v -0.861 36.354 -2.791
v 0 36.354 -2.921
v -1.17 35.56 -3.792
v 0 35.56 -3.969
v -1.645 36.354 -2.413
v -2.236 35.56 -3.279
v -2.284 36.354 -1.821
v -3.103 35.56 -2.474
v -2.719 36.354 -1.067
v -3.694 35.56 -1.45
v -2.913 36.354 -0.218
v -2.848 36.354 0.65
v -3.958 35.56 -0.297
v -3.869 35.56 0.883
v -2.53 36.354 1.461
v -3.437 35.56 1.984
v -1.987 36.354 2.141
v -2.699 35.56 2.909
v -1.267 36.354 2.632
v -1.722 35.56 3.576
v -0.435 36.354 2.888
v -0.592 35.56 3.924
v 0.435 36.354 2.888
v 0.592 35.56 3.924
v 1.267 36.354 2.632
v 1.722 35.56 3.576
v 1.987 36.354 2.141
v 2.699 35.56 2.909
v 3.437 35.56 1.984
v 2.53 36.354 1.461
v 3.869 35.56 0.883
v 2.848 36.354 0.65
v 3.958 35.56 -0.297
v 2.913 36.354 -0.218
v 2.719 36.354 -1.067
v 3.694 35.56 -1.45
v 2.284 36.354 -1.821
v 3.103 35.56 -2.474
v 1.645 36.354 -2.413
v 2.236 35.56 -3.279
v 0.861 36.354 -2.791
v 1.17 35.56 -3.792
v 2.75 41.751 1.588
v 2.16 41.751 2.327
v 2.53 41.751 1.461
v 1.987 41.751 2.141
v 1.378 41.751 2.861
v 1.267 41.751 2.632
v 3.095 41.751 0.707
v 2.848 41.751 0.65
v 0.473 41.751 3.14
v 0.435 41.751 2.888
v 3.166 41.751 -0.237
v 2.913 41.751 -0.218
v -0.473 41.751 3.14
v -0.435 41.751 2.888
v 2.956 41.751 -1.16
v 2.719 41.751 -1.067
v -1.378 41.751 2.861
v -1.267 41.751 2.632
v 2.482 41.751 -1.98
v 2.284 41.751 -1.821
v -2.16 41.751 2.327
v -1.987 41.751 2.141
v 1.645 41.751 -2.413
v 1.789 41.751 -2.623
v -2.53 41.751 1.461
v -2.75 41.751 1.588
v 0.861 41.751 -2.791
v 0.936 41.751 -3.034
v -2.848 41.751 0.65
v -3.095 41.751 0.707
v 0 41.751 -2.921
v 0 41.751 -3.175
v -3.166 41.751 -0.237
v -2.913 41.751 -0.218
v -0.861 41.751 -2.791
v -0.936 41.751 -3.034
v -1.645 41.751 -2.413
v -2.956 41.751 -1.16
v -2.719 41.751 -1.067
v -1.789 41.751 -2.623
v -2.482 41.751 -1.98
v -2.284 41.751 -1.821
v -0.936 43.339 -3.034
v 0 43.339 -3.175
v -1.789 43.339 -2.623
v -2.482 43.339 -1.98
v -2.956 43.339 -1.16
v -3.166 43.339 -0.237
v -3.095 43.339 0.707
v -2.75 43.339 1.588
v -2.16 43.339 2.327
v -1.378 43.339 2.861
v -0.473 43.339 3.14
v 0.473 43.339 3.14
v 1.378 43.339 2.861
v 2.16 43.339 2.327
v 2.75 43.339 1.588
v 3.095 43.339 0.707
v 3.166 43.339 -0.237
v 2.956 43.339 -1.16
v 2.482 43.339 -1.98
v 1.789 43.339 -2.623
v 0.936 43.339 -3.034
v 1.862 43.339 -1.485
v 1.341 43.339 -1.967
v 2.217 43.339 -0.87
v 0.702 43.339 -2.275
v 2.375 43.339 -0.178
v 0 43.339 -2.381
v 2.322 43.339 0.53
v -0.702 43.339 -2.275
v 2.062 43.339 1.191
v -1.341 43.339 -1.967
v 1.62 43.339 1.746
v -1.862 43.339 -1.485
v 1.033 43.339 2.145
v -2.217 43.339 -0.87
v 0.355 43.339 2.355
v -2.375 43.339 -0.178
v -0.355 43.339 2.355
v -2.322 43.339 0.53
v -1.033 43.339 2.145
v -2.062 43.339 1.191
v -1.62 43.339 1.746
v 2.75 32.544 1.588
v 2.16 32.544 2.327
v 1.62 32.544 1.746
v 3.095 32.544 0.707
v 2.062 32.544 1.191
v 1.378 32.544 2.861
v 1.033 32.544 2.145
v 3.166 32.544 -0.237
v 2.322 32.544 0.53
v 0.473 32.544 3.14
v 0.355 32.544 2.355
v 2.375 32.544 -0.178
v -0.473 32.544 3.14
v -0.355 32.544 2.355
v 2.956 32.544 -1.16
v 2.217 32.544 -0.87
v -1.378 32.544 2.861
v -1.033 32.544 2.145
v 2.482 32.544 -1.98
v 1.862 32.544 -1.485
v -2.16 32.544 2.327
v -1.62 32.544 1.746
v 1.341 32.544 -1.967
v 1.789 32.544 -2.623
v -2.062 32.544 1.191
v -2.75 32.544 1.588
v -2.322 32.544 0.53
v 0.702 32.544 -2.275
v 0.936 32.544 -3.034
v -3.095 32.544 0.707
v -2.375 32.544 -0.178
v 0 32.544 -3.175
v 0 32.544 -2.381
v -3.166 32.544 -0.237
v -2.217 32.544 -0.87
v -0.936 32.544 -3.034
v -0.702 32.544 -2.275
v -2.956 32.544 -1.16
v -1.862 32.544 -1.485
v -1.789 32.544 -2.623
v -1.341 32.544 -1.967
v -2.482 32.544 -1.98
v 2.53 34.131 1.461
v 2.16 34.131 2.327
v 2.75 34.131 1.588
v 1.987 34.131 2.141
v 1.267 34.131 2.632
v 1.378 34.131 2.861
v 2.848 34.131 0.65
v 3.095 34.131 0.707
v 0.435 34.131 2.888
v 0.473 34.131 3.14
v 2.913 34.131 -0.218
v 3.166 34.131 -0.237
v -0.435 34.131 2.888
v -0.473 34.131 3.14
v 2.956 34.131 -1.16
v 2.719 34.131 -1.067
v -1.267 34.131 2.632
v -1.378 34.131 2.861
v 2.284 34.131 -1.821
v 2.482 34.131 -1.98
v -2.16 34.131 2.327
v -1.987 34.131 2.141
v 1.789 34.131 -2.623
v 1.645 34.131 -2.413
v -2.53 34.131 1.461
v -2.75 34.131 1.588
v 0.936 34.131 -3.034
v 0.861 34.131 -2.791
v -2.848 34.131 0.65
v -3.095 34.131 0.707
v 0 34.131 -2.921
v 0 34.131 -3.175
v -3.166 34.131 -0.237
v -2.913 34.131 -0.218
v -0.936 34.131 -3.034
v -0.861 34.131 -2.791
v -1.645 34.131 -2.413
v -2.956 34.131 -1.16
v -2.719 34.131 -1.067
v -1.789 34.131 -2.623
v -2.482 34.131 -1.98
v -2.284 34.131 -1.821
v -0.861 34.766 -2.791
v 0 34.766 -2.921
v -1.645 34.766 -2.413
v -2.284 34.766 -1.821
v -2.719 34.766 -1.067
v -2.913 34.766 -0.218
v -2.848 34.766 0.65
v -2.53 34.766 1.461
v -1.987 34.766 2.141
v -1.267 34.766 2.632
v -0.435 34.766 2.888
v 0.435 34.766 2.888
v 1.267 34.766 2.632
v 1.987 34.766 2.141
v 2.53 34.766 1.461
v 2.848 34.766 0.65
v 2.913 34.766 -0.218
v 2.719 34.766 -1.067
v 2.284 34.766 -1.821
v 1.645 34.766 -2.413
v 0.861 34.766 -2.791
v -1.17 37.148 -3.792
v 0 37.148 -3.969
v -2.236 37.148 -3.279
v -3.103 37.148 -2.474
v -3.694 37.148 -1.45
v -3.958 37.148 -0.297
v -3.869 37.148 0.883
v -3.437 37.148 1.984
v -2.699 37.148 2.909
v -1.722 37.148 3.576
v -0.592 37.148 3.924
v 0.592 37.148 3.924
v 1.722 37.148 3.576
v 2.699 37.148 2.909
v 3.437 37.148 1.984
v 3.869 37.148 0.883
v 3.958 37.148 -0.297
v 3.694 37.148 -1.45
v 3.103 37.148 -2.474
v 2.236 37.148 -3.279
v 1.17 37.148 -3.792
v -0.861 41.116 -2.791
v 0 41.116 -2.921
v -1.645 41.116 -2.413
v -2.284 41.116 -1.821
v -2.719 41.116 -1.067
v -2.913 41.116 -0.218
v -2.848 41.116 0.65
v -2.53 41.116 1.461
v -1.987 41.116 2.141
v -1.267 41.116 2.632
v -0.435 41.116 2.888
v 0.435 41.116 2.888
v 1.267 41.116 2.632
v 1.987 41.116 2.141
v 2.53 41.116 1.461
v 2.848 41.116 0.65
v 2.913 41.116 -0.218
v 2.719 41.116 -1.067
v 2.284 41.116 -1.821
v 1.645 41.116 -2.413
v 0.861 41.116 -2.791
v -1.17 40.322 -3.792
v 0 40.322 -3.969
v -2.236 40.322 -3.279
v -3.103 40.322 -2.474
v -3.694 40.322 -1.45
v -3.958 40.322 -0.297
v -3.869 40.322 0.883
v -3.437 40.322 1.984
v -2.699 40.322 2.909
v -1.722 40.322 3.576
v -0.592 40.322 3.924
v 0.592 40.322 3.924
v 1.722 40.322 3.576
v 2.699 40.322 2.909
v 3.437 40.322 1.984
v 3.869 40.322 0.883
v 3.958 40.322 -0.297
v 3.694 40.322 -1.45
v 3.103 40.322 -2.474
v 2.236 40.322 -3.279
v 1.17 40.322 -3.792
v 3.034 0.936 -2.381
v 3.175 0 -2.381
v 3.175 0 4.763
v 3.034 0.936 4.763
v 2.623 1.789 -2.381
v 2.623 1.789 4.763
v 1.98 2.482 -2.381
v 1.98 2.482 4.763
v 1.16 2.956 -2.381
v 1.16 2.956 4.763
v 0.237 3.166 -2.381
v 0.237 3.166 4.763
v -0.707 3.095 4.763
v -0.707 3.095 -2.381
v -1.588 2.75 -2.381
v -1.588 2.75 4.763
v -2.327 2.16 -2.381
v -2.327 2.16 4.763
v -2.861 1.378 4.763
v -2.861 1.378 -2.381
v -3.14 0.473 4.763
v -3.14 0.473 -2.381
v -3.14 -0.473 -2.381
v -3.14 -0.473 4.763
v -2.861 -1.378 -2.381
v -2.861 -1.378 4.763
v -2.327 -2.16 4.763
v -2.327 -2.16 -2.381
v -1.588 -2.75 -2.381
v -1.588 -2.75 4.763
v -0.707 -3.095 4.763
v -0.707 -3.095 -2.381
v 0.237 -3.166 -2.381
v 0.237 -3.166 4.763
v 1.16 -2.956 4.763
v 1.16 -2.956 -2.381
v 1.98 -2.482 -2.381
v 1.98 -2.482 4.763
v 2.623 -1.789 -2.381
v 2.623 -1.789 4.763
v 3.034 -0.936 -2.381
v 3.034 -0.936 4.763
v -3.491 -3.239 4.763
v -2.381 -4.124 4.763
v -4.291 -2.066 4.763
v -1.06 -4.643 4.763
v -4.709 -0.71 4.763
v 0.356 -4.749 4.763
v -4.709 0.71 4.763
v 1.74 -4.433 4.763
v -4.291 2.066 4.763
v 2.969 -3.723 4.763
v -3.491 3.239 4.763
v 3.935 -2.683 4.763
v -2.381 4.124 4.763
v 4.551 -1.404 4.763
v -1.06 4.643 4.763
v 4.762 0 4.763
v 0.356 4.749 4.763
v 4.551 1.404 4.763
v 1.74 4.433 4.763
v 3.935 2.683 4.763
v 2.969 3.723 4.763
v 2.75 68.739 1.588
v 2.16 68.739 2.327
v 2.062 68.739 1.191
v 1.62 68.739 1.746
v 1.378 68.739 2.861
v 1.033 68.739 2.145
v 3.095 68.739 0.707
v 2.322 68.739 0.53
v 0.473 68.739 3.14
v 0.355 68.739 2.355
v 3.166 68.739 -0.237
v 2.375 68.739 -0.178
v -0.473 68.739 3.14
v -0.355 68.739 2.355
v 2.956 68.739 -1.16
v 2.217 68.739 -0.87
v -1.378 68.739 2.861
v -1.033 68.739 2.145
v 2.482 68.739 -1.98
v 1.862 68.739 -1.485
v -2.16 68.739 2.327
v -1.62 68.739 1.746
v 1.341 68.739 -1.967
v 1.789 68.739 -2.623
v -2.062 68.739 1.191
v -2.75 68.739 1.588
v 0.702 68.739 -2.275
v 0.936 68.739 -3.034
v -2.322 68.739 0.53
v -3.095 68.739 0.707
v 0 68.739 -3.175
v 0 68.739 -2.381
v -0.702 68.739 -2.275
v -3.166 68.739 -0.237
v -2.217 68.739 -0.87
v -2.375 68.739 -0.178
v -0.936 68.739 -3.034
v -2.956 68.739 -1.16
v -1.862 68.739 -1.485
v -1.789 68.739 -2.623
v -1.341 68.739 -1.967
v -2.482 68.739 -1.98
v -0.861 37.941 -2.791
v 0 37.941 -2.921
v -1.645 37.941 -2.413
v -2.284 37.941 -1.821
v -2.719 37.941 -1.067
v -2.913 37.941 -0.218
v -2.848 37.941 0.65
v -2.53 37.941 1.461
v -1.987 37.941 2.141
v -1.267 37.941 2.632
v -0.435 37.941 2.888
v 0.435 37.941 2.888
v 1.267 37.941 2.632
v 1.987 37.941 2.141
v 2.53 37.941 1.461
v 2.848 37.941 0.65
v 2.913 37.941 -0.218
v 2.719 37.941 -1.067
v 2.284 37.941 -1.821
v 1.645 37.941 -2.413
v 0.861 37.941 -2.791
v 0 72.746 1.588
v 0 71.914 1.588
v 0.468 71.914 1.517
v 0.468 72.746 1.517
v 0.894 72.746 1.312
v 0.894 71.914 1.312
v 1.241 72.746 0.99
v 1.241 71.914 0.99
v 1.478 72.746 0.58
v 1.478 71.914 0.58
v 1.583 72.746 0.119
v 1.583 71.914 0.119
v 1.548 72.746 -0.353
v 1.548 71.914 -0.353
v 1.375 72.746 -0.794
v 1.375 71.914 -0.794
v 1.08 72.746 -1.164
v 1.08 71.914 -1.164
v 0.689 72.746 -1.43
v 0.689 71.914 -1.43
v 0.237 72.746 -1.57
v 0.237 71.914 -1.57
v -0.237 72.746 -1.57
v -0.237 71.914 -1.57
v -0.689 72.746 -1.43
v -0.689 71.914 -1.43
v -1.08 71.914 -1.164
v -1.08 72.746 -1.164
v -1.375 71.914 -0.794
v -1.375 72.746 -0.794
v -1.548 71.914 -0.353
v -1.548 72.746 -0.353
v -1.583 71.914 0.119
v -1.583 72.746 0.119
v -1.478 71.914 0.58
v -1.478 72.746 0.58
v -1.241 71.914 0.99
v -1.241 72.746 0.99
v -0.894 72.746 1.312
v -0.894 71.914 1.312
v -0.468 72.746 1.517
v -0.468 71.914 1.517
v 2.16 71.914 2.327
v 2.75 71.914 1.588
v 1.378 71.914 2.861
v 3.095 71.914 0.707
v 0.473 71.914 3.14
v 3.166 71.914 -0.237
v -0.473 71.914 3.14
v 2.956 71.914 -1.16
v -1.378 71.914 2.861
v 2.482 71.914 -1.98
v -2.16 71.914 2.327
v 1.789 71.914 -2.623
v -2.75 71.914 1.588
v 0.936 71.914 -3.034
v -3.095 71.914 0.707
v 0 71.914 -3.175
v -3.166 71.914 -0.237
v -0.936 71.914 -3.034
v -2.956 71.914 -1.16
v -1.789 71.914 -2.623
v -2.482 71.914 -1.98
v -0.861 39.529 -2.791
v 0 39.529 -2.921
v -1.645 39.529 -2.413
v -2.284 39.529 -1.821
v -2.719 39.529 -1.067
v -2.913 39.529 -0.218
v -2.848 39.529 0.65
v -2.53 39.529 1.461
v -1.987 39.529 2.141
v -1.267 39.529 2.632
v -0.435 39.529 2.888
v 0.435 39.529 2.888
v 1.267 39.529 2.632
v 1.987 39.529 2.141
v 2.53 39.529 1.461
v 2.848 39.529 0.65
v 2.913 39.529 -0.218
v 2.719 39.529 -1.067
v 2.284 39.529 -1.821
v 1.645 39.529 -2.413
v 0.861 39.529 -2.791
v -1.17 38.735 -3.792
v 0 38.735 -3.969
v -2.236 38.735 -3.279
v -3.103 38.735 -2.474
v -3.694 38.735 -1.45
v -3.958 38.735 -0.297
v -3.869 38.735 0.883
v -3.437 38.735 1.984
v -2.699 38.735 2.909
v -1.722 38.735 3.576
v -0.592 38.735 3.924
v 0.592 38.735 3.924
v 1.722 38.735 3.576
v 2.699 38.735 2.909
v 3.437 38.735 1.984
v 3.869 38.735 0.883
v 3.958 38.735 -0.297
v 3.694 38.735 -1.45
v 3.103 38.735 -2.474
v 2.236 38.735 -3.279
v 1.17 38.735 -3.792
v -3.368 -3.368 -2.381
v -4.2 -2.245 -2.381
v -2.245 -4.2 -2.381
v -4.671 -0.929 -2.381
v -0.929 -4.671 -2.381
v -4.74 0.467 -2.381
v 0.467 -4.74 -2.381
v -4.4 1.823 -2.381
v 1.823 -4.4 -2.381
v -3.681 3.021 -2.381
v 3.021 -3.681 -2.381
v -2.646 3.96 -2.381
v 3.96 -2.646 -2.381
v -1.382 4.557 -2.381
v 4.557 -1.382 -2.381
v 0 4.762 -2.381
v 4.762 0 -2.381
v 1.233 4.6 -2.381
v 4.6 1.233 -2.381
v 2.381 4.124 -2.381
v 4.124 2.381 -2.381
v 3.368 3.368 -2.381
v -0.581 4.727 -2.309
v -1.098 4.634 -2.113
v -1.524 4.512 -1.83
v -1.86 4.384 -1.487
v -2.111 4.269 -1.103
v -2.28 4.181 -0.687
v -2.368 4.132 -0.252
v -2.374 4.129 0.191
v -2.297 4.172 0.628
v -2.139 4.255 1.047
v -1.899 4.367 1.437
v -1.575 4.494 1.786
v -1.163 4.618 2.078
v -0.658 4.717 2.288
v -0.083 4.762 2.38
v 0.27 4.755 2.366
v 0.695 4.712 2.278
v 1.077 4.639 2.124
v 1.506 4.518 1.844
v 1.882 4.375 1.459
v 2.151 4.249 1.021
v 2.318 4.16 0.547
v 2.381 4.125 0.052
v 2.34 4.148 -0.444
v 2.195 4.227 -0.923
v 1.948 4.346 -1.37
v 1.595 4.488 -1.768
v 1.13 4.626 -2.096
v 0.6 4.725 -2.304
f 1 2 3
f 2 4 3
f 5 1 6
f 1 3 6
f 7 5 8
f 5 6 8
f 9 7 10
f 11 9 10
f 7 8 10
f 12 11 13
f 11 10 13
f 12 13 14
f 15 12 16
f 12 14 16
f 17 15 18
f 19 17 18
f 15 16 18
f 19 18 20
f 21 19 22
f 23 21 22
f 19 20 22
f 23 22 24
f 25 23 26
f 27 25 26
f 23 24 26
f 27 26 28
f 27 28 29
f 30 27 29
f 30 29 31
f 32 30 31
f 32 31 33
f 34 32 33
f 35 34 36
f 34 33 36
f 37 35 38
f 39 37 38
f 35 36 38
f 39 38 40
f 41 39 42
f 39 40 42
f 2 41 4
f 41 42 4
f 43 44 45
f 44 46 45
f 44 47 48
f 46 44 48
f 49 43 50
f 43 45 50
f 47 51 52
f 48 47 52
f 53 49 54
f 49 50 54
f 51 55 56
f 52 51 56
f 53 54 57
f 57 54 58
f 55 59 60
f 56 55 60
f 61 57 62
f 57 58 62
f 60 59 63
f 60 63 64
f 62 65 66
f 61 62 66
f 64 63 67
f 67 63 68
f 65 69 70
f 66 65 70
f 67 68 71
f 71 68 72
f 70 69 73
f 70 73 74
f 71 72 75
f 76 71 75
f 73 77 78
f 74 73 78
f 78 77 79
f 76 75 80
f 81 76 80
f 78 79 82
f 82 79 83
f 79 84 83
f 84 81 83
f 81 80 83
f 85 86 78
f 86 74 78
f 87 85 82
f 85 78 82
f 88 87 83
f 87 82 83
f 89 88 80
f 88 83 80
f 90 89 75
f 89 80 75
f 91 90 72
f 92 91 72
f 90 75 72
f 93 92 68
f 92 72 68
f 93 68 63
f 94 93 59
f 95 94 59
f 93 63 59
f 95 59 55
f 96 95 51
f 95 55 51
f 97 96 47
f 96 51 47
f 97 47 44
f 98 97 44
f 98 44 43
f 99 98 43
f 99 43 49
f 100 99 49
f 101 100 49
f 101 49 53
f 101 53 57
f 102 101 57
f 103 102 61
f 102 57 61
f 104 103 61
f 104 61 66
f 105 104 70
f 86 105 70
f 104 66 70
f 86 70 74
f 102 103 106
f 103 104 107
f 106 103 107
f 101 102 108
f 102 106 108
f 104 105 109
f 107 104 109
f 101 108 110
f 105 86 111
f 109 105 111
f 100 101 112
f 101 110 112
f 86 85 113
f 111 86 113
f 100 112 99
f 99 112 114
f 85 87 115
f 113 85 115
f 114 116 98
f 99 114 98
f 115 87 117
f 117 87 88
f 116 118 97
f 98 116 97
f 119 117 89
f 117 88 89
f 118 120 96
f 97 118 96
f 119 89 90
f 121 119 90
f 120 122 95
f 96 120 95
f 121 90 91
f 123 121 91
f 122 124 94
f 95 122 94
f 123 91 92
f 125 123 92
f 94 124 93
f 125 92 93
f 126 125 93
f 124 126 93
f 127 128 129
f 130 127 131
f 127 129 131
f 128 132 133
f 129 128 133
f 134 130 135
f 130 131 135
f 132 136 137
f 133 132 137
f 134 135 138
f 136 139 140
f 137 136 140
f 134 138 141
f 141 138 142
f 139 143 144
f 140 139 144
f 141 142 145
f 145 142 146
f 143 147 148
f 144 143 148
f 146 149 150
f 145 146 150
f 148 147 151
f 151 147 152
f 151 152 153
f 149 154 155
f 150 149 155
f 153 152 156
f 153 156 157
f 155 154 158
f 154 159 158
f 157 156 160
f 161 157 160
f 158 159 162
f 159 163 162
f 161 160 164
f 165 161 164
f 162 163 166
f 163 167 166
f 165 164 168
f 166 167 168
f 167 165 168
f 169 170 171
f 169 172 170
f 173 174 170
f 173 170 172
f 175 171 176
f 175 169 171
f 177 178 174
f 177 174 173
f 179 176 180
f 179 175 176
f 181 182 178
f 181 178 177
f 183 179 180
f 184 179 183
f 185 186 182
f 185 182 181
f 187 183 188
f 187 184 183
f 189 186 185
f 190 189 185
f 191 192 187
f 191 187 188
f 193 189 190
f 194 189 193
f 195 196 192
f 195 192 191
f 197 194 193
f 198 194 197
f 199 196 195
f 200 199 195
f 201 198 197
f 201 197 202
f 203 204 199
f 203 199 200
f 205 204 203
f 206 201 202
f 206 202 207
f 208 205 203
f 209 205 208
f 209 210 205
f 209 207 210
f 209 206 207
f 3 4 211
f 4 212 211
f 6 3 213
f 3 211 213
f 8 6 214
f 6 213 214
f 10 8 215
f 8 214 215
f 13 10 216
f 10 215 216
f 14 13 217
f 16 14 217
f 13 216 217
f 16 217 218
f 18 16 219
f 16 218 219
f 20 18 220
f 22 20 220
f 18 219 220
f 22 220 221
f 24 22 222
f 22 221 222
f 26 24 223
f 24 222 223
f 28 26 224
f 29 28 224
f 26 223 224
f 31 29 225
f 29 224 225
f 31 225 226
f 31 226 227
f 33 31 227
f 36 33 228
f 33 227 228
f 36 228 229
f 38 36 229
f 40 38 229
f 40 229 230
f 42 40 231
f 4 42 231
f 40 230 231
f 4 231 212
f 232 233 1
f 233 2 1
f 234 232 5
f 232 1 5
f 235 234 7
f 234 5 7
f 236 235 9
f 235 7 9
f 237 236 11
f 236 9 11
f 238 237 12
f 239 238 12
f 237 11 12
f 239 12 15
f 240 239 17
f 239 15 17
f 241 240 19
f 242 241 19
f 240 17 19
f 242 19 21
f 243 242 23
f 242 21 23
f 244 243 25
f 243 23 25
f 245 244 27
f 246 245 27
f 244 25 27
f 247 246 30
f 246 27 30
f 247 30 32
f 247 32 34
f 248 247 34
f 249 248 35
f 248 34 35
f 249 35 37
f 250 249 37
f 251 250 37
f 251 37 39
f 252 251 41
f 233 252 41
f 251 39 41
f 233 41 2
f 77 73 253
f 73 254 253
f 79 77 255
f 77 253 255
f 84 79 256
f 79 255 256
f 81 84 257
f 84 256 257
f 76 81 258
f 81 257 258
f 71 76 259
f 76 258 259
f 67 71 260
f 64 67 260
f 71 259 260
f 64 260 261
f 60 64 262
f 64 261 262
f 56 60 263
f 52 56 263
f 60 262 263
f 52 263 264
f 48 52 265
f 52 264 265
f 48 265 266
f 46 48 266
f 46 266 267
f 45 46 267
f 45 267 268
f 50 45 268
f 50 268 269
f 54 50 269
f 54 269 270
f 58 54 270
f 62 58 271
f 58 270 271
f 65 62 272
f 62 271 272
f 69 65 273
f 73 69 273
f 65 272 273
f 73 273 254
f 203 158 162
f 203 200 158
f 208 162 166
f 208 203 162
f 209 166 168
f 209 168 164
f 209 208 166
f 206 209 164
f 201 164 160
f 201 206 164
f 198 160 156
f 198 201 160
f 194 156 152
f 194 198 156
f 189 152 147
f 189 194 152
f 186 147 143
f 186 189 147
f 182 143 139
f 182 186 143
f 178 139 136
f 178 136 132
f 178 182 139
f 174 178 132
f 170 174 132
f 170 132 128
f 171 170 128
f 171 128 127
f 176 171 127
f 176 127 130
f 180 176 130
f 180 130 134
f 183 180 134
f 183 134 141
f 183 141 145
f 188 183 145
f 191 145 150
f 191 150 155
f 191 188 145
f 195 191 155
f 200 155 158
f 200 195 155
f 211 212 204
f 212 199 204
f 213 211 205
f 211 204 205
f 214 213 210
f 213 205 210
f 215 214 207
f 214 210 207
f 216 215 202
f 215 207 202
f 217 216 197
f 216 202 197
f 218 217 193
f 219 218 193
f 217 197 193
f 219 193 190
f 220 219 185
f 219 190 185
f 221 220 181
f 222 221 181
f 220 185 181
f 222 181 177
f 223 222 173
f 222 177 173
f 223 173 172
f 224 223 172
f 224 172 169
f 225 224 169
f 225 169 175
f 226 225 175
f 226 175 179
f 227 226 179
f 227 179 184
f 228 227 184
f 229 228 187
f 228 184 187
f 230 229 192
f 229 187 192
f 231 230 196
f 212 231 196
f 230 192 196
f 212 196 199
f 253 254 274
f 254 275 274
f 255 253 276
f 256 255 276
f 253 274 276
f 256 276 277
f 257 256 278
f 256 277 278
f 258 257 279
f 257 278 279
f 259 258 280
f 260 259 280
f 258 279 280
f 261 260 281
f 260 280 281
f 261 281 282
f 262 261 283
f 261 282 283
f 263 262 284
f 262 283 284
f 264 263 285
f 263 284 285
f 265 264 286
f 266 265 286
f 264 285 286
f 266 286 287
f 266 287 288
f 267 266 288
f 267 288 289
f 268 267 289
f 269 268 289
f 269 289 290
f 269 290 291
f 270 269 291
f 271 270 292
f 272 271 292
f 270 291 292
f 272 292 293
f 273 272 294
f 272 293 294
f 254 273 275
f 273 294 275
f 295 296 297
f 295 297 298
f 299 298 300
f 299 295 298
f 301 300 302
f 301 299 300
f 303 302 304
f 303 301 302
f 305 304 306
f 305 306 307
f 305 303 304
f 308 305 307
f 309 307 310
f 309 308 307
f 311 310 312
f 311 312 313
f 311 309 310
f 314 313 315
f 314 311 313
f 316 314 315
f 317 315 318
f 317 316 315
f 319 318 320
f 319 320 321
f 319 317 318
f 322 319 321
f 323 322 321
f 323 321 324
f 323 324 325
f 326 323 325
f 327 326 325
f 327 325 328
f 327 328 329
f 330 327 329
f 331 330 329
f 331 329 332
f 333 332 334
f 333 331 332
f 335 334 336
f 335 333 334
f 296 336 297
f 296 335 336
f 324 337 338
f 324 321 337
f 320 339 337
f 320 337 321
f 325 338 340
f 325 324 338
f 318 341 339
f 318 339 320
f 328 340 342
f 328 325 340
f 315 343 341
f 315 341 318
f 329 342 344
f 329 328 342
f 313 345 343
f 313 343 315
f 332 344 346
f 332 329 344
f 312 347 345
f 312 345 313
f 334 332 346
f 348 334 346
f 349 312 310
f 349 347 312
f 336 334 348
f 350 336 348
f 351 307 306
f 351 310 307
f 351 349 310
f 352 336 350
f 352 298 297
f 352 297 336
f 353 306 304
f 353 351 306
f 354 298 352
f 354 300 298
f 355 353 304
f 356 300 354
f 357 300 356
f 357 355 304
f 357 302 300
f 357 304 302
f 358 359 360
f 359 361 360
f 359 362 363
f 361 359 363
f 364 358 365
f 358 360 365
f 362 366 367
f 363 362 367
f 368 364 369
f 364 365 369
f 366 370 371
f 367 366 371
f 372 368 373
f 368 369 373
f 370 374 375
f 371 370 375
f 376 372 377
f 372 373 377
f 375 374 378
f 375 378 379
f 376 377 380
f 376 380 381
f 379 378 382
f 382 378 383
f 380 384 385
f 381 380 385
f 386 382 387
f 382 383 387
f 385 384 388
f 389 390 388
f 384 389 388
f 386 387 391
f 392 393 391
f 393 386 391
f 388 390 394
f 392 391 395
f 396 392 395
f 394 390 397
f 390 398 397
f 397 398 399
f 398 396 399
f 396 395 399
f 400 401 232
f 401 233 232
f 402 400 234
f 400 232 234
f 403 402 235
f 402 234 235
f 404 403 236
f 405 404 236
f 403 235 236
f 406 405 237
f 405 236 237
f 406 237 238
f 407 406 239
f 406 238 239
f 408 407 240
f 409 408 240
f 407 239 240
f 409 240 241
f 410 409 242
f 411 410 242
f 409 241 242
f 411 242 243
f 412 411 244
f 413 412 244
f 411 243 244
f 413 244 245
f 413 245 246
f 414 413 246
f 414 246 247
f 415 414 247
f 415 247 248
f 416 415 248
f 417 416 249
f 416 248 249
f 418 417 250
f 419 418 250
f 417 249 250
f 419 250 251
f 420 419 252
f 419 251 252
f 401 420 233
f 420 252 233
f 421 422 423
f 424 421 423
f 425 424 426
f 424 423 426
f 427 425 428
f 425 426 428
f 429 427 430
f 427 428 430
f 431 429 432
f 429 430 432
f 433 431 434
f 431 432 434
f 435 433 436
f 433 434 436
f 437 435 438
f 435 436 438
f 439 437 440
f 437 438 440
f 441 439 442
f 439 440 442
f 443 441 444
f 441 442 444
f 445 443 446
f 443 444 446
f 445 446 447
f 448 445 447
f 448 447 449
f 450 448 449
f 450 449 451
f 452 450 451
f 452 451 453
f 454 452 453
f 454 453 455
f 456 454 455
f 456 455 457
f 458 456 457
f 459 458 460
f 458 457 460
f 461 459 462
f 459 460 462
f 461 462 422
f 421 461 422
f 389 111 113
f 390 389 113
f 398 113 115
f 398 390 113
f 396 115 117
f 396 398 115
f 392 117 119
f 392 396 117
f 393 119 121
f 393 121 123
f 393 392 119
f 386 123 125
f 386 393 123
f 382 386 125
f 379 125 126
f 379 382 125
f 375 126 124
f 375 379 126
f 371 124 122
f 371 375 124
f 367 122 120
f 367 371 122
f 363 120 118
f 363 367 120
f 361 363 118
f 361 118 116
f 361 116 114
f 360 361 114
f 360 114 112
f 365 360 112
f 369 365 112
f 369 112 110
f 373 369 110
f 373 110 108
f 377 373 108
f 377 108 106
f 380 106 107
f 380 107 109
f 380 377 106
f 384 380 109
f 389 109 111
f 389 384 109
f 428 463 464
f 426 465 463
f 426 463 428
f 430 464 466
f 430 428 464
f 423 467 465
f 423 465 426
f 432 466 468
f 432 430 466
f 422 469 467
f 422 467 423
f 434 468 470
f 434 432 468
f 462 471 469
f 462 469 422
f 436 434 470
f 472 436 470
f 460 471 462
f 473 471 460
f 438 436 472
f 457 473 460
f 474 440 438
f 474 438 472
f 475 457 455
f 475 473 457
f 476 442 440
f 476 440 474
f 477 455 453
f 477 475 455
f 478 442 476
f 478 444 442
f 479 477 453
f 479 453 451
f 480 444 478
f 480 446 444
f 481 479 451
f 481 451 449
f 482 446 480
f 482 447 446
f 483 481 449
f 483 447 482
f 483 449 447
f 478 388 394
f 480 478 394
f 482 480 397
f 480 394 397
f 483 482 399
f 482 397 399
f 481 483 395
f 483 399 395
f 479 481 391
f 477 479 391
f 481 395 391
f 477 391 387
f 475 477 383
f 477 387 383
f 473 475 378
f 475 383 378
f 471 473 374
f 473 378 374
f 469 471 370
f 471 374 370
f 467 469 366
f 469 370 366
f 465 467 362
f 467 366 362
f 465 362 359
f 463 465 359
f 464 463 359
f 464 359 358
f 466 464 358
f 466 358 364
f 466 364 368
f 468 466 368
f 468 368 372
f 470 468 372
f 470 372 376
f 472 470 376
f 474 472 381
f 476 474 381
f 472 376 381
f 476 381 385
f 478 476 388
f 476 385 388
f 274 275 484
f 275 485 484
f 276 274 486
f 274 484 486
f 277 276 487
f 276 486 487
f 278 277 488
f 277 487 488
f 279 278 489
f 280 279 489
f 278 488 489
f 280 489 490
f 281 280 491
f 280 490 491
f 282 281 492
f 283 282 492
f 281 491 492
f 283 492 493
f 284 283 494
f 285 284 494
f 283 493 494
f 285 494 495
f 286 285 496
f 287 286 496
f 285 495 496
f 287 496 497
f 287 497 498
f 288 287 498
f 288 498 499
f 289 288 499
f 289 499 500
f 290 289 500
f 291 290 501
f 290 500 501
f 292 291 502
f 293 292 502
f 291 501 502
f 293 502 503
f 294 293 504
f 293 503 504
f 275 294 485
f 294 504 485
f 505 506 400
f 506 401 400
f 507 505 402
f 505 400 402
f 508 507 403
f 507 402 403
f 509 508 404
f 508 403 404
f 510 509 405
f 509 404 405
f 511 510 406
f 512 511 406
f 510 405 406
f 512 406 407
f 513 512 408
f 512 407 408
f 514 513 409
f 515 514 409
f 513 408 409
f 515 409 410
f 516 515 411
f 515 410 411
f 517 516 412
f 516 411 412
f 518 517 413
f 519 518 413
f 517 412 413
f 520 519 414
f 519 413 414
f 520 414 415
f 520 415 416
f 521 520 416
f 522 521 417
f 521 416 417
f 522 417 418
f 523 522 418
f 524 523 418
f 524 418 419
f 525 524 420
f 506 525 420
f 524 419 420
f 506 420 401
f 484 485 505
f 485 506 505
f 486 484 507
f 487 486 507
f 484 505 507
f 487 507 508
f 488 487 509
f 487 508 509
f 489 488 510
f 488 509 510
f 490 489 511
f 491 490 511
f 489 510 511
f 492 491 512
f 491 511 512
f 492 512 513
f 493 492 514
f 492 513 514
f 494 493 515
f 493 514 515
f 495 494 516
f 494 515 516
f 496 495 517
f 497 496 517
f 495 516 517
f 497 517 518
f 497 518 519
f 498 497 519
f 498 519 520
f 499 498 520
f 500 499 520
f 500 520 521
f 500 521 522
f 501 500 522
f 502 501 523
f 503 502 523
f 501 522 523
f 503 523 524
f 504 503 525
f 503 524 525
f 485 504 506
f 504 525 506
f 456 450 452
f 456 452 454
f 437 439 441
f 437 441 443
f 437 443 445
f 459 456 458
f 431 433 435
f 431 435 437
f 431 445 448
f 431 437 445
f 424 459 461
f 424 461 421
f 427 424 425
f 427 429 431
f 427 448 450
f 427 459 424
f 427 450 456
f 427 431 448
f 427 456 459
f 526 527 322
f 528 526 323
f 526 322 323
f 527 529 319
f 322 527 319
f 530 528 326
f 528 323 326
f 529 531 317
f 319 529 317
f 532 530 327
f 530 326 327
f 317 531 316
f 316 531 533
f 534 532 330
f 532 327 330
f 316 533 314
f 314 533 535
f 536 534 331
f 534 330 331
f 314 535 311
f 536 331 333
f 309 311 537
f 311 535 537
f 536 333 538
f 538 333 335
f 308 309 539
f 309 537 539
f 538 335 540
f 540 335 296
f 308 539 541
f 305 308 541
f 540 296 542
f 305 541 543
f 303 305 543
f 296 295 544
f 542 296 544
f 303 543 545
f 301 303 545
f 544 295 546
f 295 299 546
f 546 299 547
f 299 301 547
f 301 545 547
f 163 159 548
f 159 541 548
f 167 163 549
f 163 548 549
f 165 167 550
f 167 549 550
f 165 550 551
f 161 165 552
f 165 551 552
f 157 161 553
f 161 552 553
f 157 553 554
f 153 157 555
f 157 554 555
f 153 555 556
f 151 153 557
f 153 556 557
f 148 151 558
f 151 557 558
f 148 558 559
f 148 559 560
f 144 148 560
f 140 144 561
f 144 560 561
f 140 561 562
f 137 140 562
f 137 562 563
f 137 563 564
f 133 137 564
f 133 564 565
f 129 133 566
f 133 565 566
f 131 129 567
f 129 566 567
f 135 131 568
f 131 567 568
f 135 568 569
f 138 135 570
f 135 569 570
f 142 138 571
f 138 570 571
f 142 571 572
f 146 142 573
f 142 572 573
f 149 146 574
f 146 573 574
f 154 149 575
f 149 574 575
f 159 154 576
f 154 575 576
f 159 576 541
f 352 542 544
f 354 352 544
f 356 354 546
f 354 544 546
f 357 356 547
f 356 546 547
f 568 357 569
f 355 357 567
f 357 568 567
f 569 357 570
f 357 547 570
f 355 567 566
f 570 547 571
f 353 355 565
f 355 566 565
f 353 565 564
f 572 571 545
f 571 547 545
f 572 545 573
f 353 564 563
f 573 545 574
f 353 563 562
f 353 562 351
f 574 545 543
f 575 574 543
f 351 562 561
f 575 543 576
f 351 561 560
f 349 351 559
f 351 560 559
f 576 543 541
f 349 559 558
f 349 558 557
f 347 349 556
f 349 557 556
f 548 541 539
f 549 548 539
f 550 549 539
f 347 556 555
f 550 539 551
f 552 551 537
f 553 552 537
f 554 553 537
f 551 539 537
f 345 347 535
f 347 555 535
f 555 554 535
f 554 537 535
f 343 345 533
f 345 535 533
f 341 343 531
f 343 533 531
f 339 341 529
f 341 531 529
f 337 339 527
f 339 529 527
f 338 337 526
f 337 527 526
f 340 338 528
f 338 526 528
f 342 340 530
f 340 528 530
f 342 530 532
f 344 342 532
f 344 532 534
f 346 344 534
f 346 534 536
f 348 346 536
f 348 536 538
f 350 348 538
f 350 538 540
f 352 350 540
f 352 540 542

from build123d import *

# Parameters (mm, degrees)
BOSS_EXTRUDE1_DEPTH                  = 4.7625
BOSS_EXTRUDE1_DEPTH_BACK             = 2.38125
SKETCH1_R                            = 4.7625
SKETCH1_R_2                          = 3.175
SKETCH2_R                            = 2.38125
BOSS_EXTRUDE2_DEPTH                  = 28.575
BOSS_EXTRUDE2_DIRECTION_2_REACH      = 13.666
BOSS_EXTRUDE2_DIRECTION_2_END_RADIUS = 4.7625
SKETCH3_W                            = 3.175
SKETCH3_H                            = 1.5875
BOSS_EXTRUDE3_START                  = 25.4
SKETCH4_R                            = 2.38125
BOSS_EXTRUDE3_DEPTH                  = 25.4
SKETCH5_R                            = 3.175
BOSS_EXTRUDE4_DEPTH                  = 3.175
SKETCH6_R                            = 1.5875
BOSS_EXTRUDE5_DEPTH                  = 0.83185


with BuildPart() as part:
    # Sketch1 → Boss-Extrude1 (new, two sides: drawn at the far end of the back side and taken through both)
    with BuildSketch(Plane.XY.offset(-BOSS_EXTRUDE1_DEPTH_BACK)):
        Circle(SKETCH1_R)
        Circle(SKETCH1_R_2, mode=Mode.SUBTRACT)
    extrude(amount=BOSS_EXTRUDE1_DEPTH + BOSS_EXTRUDE1_DEPTH_BACK)

    # Sketch2 → Boss-Extrude2 (add)
    with BuildSketch(Plane(origin=(0, 4.7625, 0), x_dir=(1, 0, 0), z_dir=(0, 1, 0))):
        with Locations(Location((0, 0, 0), (0, 0, 90.000000028))):
            Circle(SKETCH2_R)
    extrude(amount=BOSS_EXTRUDE2_DEPTH)

    # Boss-Extrude2 direction 2: up to this cylinder (the profile starts outside it)
    boss_extrude2_direction_2_end = Plane(origin=(0, 0, 0), z_dir=(0, 0, 1)) * Cylinder(BOSS_EXTRUDE2_DIRECTION_2_END_RADIUS, 37.857, mode=Mode.PRIVATE)
    # Sketch2 → Boss-Extrude2 direction 2 (add, up to the surface)
    with BuildSketch(Plane(origin=(0, 4.7625, 0), x_dir=(1, 0, 0), z_dir=(0, 1, 0)), mode=Mode.PRIVATE) as boss_extrude2_direction_2_sk1:
        with Locations(Location((0, 0, 0), (0, 0, 90.000000028))):
            Circle(SKETCH2_R)
    boss_extrude2_direction_2_tool1 = extrude(boss_extrude2_direction_2_sk1.sketch, amount=-BOSS_EXTRUDE2_DIRECTION_2_REACH, mode=Mode.PRIVATE) - boss_extrude2_direction_2_end
    add(boss_extrude2_direction_2_tool1.solids().sort_by_distance((0, 4.7625, 0))[0])
    add(boss_extrude2_direction_2_tool1.solids().sort_by_distance((0, 4.7625, 0))[1])

    # Sketch3 → Revolve1 (revolve)
    with BuildSketch(Plane(origin=(0, 0, 0), x_dir=(0, 0, -1), z_dir=(1, 0, 0)), mode=Mode.PRIVATE) as revolve1_sk:
        with Locations((-1.5875, 33.3375)):
            Rectangle(SKETCH3_W, SKETCH3_H)
        Polygon((-2.921, 34.76625), (-2.921, 34.13125), (0, 34.13125), (0, 43.33875), (-3.175, 43.33875), (-3.175, 41.75125), (-2.921, 41.75125), (-2.921, 41.11625), (-3.96875, 40.3225), (-2.921, 39.52875), (-3.96875, 38.735), (-2.921, 37.94125), (-3.96875, 37.1475), (-2.921, 36.35375), (-3.96875, 35.56), align=None)
    revolve(revolve1_sk.sketch.rotate(Axis((0, 32.54375, 0), (0, 1, 0)), 180), axis=Axis((0, 32.54375, 0), (0, 1, 0)))

    # Sketch4 → Boss-Extrude3 (add)
    with BuildSketch(Plane(origin=(0, 43.33875, 0), x_dir=(1, 0, 0), z_dir=(0, 1, 0)).offset(BOSS_EXTRUDE3_START)):
        with Locations(Location((0, 0, 0), (0, 0, 90))):
            Circle(SKETCH4_R)
    extrude(amount=-BOSS_EXTRUDE3_DEPTH)

    # Sketch5 → Boss-Extrude4 (add)
    with BuildSketch(Plane(origin=(0, 68.73875, 0), x_dir=(1, 0, 0), z_dir=(0, 1, 0))):
        with Locations(Location((0, 0, 0), (0, 0, 90))):
            Circle(SKETCH5_R)
    extrude(amount=BOSS_EXTRUDE4_DEPTH)

    # Sketch6 → Boss-Extrude5 (add)
    with BuildSketch(Plane(origin=(0, 71.91375, 0), x_dir=(1, 0, 0), z_dir=(0, 1, 0))):
        with Locations(Location((0, 0, 0), (0, 0, 270))):
            Circle(SKETCH6_R)
    extrude(amount=BOSS_EXTRUDE5_DEPTH)


solid = part.part
